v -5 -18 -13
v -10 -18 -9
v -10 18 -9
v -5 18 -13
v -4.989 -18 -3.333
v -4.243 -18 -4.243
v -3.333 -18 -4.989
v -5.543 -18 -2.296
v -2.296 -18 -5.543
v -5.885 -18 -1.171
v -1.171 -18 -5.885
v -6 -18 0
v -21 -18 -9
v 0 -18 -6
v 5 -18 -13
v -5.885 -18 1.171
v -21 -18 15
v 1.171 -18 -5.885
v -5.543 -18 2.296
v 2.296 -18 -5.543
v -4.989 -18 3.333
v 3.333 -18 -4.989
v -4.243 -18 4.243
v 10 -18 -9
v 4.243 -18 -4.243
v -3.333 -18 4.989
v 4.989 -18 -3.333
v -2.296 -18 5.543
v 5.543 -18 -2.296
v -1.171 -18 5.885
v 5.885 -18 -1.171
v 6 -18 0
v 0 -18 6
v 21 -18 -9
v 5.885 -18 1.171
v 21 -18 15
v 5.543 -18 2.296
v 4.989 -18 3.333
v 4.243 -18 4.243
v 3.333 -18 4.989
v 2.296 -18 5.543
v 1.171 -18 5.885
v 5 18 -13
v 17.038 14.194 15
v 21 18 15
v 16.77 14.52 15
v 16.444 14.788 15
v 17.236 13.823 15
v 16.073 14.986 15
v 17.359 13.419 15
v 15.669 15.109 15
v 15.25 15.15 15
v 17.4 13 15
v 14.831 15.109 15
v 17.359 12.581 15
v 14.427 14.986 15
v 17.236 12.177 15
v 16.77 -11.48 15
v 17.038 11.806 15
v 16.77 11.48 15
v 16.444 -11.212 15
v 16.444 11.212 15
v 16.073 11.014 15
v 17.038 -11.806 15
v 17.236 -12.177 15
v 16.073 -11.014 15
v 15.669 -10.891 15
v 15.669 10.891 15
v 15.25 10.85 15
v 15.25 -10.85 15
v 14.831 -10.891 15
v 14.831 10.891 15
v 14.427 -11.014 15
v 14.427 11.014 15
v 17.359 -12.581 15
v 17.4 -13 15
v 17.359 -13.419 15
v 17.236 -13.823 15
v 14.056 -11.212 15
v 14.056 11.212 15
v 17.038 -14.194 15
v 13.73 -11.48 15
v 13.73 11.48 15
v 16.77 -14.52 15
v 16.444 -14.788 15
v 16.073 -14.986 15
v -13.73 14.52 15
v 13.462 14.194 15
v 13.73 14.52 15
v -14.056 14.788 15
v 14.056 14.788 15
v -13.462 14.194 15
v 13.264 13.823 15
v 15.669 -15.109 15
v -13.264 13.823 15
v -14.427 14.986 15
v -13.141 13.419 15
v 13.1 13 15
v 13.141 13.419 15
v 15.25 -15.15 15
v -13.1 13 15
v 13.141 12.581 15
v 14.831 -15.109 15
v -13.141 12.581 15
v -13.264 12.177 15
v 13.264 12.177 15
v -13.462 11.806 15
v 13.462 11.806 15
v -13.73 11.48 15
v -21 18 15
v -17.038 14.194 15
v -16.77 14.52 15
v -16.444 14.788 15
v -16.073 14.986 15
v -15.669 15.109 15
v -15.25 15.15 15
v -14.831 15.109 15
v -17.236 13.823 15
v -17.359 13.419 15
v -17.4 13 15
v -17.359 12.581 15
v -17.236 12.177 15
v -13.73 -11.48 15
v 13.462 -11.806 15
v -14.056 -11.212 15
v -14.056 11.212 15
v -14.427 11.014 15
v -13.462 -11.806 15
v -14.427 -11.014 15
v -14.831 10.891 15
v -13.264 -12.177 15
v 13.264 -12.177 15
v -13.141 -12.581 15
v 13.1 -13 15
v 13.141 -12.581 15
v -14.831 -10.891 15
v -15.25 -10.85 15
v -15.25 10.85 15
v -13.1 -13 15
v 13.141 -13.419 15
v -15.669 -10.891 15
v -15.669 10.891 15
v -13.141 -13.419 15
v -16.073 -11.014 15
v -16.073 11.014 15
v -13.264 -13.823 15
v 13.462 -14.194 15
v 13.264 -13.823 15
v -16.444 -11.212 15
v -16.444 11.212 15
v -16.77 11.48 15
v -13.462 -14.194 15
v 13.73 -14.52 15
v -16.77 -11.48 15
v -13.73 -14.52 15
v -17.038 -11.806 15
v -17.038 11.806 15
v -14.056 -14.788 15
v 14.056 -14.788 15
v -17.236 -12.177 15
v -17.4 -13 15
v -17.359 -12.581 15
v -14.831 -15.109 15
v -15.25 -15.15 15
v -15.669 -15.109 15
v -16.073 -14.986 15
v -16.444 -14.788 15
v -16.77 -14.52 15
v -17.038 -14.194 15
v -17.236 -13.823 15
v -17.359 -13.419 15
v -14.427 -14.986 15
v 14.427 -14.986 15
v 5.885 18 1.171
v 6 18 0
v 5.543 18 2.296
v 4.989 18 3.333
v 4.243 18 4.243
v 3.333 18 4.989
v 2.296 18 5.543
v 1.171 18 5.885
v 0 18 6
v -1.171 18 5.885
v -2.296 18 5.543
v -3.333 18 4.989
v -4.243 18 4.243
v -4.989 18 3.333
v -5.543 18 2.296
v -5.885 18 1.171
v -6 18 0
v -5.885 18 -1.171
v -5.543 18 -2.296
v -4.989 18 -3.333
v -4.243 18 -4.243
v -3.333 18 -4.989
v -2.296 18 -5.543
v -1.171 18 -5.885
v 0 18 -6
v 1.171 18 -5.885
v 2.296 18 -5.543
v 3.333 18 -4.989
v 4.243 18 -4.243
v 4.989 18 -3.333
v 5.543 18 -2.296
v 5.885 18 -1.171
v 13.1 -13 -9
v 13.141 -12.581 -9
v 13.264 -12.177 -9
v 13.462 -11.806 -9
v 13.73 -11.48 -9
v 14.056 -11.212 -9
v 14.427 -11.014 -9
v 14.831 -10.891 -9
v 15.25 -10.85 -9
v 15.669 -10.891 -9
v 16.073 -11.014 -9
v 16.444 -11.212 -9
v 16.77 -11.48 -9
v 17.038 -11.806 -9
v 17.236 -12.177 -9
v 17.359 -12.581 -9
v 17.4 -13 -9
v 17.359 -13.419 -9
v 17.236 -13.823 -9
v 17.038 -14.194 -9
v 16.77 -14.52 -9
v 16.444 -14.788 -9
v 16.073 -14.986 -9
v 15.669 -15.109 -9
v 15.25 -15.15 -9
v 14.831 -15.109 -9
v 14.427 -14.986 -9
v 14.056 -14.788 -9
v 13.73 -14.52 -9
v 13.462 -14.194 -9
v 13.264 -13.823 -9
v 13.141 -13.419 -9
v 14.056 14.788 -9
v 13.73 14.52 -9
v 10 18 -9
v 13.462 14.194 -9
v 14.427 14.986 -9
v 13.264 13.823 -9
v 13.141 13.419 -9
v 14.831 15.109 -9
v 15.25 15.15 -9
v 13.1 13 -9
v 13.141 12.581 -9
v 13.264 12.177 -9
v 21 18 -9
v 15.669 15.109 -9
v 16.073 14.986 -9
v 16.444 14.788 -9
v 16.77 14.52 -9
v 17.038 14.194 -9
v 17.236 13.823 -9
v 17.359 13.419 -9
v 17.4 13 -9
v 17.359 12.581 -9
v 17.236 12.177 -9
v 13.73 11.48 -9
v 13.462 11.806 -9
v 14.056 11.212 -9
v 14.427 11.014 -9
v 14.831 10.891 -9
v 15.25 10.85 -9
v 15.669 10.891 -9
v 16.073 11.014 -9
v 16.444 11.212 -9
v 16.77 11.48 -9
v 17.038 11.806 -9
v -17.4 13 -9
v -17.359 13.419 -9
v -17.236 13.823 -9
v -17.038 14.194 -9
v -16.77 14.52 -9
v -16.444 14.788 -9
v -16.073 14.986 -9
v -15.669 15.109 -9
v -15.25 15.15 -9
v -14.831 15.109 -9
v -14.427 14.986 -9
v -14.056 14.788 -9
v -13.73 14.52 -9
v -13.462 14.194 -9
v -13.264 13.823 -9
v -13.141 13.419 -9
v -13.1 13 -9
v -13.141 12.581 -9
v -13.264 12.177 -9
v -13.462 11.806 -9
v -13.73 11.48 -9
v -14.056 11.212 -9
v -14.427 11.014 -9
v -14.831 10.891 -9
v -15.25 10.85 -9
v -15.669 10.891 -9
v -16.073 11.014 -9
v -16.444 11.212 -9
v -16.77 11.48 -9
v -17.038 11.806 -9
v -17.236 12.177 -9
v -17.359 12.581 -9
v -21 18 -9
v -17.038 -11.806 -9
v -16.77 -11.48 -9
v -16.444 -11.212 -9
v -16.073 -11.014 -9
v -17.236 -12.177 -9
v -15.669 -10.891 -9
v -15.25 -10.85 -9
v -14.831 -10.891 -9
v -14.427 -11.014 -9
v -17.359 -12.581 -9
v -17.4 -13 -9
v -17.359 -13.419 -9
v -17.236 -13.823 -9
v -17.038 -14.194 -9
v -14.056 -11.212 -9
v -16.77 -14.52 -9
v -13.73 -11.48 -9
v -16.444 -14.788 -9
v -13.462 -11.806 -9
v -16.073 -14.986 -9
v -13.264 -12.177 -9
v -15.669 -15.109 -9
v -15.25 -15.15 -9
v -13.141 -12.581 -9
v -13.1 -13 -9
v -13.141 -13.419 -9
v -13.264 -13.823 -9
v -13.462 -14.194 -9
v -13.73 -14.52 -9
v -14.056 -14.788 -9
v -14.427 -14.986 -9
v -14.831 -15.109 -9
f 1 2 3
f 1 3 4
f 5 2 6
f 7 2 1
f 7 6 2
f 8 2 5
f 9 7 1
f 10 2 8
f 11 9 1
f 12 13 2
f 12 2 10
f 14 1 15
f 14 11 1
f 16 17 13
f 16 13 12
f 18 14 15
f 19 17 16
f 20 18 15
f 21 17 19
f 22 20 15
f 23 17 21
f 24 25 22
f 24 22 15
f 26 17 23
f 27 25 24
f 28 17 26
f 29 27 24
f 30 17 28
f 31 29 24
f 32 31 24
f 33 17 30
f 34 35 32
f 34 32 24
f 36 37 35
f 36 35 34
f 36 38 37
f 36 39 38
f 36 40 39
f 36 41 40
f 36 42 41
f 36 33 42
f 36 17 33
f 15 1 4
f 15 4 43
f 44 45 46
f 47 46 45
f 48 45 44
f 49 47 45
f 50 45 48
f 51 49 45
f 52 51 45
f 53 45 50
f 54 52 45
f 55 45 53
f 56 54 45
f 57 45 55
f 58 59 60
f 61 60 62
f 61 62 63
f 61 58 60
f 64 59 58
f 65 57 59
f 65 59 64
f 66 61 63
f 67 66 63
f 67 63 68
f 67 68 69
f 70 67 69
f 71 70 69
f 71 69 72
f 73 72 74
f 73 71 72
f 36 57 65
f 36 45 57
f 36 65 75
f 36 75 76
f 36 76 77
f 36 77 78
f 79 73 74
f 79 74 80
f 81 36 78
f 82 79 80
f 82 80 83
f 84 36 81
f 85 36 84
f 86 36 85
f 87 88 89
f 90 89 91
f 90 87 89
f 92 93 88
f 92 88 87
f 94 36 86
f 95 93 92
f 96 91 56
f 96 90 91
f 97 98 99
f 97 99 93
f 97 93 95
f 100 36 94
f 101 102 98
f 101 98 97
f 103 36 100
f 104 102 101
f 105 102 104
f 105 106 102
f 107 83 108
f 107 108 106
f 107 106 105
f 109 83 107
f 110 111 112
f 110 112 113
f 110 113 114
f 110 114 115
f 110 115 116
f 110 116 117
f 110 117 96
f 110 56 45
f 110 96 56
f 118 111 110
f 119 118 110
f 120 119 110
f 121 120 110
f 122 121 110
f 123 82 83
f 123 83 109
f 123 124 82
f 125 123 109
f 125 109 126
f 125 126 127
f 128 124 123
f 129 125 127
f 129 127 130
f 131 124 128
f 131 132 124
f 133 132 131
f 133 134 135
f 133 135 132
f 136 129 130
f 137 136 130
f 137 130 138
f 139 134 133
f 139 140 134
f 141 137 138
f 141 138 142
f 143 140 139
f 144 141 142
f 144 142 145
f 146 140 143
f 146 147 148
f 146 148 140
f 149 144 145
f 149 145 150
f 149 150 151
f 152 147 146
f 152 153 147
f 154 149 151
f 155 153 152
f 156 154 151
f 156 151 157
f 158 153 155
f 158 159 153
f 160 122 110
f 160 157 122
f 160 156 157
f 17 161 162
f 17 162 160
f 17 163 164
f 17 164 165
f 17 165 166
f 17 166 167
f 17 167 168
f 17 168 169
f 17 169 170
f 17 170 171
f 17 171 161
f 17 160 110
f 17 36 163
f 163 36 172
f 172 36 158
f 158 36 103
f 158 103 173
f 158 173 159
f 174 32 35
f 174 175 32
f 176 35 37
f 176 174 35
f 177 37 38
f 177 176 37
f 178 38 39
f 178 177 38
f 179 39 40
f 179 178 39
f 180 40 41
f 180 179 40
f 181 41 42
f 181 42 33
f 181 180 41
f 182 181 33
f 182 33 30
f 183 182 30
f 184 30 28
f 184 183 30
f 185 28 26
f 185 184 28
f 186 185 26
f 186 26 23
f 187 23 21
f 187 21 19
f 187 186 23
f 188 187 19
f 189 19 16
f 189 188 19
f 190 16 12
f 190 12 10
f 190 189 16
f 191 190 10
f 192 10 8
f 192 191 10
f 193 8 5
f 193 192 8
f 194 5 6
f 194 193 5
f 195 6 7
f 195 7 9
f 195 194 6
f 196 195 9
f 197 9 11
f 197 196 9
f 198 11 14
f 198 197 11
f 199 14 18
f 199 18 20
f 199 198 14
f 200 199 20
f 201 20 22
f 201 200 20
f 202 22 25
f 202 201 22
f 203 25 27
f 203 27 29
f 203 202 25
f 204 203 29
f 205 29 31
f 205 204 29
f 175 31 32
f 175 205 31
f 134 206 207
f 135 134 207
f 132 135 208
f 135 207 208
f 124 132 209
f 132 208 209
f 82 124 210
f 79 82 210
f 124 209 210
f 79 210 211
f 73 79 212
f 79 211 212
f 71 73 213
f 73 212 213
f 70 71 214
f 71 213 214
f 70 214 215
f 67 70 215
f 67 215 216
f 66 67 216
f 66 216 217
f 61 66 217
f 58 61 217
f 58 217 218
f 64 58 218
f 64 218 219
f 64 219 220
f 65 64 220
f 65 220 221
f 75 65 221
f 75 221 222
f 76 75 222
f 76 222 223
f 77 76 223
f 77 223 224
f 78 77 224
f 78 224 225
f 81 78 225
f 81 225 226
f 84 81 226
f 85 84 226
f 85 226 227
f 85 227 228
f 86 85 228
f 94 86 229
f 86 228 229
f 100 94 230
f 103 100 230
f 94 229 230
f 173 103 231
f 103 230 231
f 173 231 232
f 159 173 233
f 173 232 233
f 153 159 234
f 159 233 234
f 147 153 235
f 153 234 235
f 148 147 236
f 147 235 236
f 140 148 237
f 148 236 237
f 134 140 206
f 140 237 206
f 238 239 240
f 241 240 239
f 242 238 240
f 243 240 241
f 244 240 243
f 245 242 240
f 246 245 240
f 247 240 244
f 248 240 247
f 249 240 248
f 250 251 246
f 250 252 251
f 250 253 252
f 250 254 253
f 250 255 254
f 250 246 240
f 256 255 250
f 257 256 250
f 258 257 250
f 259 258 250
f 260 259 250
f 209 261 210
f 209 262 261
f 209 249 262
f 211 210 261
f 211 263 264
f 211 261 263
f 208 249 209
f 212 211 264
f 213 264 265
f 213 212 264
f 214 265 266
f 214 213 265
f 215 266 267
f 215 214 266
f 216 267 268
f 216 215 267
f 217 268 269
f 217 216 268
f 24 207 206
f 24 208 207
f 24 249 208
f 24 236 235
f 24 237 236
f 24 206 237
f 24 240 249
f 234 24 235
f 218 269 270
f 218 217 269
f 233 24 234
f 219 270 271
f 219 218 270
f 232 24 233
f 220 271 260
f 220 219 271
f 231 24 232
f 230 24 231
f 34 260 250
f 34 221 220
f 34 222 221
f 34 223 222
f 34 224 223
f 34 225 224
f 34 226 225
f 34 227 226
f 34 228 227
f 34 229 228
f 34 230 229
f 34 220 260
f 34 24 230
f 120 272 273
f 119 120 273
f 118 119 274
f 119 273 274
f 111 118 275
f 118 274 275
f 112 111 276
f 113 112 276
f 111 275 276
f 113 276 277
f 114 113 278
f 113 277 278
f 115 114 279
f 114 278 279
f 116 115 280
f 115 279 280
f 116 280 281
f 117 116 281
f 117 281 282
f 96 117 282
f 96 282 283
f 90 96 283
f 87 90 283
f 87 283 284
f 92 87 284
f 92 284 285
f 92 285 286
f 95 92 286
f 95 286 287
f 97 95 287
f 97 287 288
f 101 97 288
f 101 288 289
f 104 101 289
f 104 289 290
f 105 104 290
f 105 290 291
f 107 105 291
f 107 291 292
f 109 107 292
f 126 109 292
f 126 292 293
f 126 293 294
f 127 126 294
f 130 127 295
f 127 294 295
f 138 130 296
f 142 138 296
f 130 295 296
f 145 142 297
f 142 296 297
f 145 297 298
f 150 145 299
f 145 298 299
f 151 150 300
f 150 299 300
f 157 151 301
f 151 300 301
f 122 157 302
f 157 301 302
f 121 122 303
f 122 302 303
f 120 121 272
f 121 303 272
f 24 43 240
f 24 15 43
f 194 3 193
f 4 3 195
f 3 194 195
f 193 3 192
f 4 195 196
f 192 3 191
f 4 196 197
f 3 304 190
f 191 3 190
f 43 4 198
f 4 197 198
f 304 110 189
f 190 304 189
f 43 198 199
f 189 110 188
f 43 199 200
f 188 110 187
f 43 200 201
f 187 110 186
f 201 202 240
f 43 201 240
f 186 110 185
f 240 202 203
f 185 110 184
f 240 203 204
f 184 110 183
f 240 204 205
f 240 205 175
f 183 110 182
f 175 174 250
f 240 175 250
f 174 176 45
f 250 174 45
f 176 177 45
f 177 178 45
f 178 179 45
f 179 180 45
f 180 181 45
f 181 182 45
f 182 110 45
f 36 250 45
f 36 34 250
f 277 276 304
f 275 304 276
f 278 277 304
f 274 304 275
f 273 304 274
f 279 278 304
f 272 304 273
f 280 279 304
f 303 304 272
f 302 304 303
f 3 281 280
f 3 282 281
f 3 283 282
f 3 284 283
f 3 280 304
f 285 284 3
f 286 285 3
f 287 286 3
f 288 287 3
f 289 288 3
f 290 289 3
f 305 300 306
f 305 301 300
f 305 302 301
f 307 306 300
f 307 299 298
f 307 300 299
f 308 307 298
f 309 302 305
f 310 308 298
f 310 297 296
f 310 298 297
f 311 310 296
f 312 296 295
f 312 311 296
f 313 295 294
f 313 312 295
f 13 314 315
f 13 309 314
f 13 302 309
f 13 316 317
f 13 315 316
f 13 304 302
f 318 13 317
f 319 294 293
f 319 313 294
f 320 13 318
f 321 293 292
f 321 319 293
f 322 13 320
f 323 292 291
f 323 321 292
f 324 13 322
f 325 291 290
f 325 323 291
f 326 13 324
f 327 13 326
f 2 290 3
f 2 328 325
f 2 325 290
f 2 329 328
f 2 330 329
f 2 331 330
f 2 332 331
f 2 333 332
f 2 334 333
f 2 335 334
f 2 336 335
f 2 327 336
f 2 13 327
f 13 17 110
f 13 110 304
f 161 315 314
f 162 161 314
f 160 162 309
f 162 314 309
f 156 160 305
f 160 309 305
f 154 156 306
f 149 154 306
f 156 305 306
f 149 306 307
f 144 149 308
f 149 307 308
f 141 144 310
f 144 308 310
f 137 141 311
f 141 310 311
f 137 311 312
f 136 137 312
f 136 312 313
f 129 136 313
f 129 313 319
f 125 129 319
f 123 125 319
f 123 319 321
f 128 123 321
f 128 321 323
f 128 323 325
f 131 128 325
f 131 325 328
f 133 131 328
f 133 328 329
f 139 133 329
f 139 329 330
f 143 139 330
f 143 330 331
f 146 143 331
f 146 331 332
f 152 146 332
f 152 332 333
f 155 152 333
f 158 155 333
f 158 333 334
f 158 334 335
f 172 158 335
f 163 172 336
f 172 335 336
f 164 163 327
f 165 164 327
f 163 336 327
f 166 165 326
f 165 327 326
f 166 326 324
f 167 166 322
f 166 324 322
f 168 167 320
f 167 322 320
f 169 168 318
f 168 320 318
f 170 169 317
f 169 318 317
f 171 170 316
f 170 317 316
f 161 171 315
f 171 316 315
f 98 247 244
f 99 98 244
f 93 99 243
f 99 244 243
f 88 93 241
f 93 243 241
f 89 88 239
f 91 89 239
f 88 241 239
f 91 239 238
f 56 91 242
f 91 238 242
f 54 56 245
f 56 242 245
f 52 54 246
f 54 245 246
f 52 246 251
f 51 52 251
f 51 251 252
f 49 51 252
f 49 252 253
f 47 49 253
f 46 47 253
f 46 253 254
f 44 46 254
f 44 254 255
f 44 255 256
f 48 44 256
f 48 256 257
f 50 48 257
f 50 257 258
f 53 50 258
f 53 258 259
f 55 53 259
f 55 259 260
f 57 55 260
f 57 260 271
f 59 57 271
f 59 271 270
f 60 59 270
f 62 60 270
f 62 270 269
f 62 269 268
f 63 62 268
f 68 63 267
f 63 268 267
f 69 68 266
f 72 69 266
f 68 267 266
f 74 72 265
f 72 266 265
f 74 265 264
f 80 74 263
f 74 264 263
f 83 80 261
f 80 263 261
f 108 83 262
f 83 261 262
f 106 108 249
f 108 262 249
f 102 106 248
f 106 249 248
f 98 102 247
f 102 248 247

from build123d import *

# Parameters (mm, degrees)
F0_R     = 6
F1_DEPTH = 18
F3_D     = 4.3


with BuildPart() as f1:
    # F0 (on Front) → F1 (new body, symmetric)
    with BuildSketch(Plane.XZ):
        Polygon((21, 15), (-21, 15), (-21, -9), (-10, -9), (-5, -13), (0, -13), (5, -13), (10, -9), (21, -9), align=None)
        Circle(F0_R, mode=Mode.SUBTRACT)
    extrude(amount=F1_DEPTH, both=True)

    # F3 (through all)
    with Locations(Plane.XY.offset(15)):
        with Locations((-15.25, 13), (15.25, 13), (15.25, -13), (-15.25, -13)):
            Hole(F3_D / 2)


solid = f1.part
